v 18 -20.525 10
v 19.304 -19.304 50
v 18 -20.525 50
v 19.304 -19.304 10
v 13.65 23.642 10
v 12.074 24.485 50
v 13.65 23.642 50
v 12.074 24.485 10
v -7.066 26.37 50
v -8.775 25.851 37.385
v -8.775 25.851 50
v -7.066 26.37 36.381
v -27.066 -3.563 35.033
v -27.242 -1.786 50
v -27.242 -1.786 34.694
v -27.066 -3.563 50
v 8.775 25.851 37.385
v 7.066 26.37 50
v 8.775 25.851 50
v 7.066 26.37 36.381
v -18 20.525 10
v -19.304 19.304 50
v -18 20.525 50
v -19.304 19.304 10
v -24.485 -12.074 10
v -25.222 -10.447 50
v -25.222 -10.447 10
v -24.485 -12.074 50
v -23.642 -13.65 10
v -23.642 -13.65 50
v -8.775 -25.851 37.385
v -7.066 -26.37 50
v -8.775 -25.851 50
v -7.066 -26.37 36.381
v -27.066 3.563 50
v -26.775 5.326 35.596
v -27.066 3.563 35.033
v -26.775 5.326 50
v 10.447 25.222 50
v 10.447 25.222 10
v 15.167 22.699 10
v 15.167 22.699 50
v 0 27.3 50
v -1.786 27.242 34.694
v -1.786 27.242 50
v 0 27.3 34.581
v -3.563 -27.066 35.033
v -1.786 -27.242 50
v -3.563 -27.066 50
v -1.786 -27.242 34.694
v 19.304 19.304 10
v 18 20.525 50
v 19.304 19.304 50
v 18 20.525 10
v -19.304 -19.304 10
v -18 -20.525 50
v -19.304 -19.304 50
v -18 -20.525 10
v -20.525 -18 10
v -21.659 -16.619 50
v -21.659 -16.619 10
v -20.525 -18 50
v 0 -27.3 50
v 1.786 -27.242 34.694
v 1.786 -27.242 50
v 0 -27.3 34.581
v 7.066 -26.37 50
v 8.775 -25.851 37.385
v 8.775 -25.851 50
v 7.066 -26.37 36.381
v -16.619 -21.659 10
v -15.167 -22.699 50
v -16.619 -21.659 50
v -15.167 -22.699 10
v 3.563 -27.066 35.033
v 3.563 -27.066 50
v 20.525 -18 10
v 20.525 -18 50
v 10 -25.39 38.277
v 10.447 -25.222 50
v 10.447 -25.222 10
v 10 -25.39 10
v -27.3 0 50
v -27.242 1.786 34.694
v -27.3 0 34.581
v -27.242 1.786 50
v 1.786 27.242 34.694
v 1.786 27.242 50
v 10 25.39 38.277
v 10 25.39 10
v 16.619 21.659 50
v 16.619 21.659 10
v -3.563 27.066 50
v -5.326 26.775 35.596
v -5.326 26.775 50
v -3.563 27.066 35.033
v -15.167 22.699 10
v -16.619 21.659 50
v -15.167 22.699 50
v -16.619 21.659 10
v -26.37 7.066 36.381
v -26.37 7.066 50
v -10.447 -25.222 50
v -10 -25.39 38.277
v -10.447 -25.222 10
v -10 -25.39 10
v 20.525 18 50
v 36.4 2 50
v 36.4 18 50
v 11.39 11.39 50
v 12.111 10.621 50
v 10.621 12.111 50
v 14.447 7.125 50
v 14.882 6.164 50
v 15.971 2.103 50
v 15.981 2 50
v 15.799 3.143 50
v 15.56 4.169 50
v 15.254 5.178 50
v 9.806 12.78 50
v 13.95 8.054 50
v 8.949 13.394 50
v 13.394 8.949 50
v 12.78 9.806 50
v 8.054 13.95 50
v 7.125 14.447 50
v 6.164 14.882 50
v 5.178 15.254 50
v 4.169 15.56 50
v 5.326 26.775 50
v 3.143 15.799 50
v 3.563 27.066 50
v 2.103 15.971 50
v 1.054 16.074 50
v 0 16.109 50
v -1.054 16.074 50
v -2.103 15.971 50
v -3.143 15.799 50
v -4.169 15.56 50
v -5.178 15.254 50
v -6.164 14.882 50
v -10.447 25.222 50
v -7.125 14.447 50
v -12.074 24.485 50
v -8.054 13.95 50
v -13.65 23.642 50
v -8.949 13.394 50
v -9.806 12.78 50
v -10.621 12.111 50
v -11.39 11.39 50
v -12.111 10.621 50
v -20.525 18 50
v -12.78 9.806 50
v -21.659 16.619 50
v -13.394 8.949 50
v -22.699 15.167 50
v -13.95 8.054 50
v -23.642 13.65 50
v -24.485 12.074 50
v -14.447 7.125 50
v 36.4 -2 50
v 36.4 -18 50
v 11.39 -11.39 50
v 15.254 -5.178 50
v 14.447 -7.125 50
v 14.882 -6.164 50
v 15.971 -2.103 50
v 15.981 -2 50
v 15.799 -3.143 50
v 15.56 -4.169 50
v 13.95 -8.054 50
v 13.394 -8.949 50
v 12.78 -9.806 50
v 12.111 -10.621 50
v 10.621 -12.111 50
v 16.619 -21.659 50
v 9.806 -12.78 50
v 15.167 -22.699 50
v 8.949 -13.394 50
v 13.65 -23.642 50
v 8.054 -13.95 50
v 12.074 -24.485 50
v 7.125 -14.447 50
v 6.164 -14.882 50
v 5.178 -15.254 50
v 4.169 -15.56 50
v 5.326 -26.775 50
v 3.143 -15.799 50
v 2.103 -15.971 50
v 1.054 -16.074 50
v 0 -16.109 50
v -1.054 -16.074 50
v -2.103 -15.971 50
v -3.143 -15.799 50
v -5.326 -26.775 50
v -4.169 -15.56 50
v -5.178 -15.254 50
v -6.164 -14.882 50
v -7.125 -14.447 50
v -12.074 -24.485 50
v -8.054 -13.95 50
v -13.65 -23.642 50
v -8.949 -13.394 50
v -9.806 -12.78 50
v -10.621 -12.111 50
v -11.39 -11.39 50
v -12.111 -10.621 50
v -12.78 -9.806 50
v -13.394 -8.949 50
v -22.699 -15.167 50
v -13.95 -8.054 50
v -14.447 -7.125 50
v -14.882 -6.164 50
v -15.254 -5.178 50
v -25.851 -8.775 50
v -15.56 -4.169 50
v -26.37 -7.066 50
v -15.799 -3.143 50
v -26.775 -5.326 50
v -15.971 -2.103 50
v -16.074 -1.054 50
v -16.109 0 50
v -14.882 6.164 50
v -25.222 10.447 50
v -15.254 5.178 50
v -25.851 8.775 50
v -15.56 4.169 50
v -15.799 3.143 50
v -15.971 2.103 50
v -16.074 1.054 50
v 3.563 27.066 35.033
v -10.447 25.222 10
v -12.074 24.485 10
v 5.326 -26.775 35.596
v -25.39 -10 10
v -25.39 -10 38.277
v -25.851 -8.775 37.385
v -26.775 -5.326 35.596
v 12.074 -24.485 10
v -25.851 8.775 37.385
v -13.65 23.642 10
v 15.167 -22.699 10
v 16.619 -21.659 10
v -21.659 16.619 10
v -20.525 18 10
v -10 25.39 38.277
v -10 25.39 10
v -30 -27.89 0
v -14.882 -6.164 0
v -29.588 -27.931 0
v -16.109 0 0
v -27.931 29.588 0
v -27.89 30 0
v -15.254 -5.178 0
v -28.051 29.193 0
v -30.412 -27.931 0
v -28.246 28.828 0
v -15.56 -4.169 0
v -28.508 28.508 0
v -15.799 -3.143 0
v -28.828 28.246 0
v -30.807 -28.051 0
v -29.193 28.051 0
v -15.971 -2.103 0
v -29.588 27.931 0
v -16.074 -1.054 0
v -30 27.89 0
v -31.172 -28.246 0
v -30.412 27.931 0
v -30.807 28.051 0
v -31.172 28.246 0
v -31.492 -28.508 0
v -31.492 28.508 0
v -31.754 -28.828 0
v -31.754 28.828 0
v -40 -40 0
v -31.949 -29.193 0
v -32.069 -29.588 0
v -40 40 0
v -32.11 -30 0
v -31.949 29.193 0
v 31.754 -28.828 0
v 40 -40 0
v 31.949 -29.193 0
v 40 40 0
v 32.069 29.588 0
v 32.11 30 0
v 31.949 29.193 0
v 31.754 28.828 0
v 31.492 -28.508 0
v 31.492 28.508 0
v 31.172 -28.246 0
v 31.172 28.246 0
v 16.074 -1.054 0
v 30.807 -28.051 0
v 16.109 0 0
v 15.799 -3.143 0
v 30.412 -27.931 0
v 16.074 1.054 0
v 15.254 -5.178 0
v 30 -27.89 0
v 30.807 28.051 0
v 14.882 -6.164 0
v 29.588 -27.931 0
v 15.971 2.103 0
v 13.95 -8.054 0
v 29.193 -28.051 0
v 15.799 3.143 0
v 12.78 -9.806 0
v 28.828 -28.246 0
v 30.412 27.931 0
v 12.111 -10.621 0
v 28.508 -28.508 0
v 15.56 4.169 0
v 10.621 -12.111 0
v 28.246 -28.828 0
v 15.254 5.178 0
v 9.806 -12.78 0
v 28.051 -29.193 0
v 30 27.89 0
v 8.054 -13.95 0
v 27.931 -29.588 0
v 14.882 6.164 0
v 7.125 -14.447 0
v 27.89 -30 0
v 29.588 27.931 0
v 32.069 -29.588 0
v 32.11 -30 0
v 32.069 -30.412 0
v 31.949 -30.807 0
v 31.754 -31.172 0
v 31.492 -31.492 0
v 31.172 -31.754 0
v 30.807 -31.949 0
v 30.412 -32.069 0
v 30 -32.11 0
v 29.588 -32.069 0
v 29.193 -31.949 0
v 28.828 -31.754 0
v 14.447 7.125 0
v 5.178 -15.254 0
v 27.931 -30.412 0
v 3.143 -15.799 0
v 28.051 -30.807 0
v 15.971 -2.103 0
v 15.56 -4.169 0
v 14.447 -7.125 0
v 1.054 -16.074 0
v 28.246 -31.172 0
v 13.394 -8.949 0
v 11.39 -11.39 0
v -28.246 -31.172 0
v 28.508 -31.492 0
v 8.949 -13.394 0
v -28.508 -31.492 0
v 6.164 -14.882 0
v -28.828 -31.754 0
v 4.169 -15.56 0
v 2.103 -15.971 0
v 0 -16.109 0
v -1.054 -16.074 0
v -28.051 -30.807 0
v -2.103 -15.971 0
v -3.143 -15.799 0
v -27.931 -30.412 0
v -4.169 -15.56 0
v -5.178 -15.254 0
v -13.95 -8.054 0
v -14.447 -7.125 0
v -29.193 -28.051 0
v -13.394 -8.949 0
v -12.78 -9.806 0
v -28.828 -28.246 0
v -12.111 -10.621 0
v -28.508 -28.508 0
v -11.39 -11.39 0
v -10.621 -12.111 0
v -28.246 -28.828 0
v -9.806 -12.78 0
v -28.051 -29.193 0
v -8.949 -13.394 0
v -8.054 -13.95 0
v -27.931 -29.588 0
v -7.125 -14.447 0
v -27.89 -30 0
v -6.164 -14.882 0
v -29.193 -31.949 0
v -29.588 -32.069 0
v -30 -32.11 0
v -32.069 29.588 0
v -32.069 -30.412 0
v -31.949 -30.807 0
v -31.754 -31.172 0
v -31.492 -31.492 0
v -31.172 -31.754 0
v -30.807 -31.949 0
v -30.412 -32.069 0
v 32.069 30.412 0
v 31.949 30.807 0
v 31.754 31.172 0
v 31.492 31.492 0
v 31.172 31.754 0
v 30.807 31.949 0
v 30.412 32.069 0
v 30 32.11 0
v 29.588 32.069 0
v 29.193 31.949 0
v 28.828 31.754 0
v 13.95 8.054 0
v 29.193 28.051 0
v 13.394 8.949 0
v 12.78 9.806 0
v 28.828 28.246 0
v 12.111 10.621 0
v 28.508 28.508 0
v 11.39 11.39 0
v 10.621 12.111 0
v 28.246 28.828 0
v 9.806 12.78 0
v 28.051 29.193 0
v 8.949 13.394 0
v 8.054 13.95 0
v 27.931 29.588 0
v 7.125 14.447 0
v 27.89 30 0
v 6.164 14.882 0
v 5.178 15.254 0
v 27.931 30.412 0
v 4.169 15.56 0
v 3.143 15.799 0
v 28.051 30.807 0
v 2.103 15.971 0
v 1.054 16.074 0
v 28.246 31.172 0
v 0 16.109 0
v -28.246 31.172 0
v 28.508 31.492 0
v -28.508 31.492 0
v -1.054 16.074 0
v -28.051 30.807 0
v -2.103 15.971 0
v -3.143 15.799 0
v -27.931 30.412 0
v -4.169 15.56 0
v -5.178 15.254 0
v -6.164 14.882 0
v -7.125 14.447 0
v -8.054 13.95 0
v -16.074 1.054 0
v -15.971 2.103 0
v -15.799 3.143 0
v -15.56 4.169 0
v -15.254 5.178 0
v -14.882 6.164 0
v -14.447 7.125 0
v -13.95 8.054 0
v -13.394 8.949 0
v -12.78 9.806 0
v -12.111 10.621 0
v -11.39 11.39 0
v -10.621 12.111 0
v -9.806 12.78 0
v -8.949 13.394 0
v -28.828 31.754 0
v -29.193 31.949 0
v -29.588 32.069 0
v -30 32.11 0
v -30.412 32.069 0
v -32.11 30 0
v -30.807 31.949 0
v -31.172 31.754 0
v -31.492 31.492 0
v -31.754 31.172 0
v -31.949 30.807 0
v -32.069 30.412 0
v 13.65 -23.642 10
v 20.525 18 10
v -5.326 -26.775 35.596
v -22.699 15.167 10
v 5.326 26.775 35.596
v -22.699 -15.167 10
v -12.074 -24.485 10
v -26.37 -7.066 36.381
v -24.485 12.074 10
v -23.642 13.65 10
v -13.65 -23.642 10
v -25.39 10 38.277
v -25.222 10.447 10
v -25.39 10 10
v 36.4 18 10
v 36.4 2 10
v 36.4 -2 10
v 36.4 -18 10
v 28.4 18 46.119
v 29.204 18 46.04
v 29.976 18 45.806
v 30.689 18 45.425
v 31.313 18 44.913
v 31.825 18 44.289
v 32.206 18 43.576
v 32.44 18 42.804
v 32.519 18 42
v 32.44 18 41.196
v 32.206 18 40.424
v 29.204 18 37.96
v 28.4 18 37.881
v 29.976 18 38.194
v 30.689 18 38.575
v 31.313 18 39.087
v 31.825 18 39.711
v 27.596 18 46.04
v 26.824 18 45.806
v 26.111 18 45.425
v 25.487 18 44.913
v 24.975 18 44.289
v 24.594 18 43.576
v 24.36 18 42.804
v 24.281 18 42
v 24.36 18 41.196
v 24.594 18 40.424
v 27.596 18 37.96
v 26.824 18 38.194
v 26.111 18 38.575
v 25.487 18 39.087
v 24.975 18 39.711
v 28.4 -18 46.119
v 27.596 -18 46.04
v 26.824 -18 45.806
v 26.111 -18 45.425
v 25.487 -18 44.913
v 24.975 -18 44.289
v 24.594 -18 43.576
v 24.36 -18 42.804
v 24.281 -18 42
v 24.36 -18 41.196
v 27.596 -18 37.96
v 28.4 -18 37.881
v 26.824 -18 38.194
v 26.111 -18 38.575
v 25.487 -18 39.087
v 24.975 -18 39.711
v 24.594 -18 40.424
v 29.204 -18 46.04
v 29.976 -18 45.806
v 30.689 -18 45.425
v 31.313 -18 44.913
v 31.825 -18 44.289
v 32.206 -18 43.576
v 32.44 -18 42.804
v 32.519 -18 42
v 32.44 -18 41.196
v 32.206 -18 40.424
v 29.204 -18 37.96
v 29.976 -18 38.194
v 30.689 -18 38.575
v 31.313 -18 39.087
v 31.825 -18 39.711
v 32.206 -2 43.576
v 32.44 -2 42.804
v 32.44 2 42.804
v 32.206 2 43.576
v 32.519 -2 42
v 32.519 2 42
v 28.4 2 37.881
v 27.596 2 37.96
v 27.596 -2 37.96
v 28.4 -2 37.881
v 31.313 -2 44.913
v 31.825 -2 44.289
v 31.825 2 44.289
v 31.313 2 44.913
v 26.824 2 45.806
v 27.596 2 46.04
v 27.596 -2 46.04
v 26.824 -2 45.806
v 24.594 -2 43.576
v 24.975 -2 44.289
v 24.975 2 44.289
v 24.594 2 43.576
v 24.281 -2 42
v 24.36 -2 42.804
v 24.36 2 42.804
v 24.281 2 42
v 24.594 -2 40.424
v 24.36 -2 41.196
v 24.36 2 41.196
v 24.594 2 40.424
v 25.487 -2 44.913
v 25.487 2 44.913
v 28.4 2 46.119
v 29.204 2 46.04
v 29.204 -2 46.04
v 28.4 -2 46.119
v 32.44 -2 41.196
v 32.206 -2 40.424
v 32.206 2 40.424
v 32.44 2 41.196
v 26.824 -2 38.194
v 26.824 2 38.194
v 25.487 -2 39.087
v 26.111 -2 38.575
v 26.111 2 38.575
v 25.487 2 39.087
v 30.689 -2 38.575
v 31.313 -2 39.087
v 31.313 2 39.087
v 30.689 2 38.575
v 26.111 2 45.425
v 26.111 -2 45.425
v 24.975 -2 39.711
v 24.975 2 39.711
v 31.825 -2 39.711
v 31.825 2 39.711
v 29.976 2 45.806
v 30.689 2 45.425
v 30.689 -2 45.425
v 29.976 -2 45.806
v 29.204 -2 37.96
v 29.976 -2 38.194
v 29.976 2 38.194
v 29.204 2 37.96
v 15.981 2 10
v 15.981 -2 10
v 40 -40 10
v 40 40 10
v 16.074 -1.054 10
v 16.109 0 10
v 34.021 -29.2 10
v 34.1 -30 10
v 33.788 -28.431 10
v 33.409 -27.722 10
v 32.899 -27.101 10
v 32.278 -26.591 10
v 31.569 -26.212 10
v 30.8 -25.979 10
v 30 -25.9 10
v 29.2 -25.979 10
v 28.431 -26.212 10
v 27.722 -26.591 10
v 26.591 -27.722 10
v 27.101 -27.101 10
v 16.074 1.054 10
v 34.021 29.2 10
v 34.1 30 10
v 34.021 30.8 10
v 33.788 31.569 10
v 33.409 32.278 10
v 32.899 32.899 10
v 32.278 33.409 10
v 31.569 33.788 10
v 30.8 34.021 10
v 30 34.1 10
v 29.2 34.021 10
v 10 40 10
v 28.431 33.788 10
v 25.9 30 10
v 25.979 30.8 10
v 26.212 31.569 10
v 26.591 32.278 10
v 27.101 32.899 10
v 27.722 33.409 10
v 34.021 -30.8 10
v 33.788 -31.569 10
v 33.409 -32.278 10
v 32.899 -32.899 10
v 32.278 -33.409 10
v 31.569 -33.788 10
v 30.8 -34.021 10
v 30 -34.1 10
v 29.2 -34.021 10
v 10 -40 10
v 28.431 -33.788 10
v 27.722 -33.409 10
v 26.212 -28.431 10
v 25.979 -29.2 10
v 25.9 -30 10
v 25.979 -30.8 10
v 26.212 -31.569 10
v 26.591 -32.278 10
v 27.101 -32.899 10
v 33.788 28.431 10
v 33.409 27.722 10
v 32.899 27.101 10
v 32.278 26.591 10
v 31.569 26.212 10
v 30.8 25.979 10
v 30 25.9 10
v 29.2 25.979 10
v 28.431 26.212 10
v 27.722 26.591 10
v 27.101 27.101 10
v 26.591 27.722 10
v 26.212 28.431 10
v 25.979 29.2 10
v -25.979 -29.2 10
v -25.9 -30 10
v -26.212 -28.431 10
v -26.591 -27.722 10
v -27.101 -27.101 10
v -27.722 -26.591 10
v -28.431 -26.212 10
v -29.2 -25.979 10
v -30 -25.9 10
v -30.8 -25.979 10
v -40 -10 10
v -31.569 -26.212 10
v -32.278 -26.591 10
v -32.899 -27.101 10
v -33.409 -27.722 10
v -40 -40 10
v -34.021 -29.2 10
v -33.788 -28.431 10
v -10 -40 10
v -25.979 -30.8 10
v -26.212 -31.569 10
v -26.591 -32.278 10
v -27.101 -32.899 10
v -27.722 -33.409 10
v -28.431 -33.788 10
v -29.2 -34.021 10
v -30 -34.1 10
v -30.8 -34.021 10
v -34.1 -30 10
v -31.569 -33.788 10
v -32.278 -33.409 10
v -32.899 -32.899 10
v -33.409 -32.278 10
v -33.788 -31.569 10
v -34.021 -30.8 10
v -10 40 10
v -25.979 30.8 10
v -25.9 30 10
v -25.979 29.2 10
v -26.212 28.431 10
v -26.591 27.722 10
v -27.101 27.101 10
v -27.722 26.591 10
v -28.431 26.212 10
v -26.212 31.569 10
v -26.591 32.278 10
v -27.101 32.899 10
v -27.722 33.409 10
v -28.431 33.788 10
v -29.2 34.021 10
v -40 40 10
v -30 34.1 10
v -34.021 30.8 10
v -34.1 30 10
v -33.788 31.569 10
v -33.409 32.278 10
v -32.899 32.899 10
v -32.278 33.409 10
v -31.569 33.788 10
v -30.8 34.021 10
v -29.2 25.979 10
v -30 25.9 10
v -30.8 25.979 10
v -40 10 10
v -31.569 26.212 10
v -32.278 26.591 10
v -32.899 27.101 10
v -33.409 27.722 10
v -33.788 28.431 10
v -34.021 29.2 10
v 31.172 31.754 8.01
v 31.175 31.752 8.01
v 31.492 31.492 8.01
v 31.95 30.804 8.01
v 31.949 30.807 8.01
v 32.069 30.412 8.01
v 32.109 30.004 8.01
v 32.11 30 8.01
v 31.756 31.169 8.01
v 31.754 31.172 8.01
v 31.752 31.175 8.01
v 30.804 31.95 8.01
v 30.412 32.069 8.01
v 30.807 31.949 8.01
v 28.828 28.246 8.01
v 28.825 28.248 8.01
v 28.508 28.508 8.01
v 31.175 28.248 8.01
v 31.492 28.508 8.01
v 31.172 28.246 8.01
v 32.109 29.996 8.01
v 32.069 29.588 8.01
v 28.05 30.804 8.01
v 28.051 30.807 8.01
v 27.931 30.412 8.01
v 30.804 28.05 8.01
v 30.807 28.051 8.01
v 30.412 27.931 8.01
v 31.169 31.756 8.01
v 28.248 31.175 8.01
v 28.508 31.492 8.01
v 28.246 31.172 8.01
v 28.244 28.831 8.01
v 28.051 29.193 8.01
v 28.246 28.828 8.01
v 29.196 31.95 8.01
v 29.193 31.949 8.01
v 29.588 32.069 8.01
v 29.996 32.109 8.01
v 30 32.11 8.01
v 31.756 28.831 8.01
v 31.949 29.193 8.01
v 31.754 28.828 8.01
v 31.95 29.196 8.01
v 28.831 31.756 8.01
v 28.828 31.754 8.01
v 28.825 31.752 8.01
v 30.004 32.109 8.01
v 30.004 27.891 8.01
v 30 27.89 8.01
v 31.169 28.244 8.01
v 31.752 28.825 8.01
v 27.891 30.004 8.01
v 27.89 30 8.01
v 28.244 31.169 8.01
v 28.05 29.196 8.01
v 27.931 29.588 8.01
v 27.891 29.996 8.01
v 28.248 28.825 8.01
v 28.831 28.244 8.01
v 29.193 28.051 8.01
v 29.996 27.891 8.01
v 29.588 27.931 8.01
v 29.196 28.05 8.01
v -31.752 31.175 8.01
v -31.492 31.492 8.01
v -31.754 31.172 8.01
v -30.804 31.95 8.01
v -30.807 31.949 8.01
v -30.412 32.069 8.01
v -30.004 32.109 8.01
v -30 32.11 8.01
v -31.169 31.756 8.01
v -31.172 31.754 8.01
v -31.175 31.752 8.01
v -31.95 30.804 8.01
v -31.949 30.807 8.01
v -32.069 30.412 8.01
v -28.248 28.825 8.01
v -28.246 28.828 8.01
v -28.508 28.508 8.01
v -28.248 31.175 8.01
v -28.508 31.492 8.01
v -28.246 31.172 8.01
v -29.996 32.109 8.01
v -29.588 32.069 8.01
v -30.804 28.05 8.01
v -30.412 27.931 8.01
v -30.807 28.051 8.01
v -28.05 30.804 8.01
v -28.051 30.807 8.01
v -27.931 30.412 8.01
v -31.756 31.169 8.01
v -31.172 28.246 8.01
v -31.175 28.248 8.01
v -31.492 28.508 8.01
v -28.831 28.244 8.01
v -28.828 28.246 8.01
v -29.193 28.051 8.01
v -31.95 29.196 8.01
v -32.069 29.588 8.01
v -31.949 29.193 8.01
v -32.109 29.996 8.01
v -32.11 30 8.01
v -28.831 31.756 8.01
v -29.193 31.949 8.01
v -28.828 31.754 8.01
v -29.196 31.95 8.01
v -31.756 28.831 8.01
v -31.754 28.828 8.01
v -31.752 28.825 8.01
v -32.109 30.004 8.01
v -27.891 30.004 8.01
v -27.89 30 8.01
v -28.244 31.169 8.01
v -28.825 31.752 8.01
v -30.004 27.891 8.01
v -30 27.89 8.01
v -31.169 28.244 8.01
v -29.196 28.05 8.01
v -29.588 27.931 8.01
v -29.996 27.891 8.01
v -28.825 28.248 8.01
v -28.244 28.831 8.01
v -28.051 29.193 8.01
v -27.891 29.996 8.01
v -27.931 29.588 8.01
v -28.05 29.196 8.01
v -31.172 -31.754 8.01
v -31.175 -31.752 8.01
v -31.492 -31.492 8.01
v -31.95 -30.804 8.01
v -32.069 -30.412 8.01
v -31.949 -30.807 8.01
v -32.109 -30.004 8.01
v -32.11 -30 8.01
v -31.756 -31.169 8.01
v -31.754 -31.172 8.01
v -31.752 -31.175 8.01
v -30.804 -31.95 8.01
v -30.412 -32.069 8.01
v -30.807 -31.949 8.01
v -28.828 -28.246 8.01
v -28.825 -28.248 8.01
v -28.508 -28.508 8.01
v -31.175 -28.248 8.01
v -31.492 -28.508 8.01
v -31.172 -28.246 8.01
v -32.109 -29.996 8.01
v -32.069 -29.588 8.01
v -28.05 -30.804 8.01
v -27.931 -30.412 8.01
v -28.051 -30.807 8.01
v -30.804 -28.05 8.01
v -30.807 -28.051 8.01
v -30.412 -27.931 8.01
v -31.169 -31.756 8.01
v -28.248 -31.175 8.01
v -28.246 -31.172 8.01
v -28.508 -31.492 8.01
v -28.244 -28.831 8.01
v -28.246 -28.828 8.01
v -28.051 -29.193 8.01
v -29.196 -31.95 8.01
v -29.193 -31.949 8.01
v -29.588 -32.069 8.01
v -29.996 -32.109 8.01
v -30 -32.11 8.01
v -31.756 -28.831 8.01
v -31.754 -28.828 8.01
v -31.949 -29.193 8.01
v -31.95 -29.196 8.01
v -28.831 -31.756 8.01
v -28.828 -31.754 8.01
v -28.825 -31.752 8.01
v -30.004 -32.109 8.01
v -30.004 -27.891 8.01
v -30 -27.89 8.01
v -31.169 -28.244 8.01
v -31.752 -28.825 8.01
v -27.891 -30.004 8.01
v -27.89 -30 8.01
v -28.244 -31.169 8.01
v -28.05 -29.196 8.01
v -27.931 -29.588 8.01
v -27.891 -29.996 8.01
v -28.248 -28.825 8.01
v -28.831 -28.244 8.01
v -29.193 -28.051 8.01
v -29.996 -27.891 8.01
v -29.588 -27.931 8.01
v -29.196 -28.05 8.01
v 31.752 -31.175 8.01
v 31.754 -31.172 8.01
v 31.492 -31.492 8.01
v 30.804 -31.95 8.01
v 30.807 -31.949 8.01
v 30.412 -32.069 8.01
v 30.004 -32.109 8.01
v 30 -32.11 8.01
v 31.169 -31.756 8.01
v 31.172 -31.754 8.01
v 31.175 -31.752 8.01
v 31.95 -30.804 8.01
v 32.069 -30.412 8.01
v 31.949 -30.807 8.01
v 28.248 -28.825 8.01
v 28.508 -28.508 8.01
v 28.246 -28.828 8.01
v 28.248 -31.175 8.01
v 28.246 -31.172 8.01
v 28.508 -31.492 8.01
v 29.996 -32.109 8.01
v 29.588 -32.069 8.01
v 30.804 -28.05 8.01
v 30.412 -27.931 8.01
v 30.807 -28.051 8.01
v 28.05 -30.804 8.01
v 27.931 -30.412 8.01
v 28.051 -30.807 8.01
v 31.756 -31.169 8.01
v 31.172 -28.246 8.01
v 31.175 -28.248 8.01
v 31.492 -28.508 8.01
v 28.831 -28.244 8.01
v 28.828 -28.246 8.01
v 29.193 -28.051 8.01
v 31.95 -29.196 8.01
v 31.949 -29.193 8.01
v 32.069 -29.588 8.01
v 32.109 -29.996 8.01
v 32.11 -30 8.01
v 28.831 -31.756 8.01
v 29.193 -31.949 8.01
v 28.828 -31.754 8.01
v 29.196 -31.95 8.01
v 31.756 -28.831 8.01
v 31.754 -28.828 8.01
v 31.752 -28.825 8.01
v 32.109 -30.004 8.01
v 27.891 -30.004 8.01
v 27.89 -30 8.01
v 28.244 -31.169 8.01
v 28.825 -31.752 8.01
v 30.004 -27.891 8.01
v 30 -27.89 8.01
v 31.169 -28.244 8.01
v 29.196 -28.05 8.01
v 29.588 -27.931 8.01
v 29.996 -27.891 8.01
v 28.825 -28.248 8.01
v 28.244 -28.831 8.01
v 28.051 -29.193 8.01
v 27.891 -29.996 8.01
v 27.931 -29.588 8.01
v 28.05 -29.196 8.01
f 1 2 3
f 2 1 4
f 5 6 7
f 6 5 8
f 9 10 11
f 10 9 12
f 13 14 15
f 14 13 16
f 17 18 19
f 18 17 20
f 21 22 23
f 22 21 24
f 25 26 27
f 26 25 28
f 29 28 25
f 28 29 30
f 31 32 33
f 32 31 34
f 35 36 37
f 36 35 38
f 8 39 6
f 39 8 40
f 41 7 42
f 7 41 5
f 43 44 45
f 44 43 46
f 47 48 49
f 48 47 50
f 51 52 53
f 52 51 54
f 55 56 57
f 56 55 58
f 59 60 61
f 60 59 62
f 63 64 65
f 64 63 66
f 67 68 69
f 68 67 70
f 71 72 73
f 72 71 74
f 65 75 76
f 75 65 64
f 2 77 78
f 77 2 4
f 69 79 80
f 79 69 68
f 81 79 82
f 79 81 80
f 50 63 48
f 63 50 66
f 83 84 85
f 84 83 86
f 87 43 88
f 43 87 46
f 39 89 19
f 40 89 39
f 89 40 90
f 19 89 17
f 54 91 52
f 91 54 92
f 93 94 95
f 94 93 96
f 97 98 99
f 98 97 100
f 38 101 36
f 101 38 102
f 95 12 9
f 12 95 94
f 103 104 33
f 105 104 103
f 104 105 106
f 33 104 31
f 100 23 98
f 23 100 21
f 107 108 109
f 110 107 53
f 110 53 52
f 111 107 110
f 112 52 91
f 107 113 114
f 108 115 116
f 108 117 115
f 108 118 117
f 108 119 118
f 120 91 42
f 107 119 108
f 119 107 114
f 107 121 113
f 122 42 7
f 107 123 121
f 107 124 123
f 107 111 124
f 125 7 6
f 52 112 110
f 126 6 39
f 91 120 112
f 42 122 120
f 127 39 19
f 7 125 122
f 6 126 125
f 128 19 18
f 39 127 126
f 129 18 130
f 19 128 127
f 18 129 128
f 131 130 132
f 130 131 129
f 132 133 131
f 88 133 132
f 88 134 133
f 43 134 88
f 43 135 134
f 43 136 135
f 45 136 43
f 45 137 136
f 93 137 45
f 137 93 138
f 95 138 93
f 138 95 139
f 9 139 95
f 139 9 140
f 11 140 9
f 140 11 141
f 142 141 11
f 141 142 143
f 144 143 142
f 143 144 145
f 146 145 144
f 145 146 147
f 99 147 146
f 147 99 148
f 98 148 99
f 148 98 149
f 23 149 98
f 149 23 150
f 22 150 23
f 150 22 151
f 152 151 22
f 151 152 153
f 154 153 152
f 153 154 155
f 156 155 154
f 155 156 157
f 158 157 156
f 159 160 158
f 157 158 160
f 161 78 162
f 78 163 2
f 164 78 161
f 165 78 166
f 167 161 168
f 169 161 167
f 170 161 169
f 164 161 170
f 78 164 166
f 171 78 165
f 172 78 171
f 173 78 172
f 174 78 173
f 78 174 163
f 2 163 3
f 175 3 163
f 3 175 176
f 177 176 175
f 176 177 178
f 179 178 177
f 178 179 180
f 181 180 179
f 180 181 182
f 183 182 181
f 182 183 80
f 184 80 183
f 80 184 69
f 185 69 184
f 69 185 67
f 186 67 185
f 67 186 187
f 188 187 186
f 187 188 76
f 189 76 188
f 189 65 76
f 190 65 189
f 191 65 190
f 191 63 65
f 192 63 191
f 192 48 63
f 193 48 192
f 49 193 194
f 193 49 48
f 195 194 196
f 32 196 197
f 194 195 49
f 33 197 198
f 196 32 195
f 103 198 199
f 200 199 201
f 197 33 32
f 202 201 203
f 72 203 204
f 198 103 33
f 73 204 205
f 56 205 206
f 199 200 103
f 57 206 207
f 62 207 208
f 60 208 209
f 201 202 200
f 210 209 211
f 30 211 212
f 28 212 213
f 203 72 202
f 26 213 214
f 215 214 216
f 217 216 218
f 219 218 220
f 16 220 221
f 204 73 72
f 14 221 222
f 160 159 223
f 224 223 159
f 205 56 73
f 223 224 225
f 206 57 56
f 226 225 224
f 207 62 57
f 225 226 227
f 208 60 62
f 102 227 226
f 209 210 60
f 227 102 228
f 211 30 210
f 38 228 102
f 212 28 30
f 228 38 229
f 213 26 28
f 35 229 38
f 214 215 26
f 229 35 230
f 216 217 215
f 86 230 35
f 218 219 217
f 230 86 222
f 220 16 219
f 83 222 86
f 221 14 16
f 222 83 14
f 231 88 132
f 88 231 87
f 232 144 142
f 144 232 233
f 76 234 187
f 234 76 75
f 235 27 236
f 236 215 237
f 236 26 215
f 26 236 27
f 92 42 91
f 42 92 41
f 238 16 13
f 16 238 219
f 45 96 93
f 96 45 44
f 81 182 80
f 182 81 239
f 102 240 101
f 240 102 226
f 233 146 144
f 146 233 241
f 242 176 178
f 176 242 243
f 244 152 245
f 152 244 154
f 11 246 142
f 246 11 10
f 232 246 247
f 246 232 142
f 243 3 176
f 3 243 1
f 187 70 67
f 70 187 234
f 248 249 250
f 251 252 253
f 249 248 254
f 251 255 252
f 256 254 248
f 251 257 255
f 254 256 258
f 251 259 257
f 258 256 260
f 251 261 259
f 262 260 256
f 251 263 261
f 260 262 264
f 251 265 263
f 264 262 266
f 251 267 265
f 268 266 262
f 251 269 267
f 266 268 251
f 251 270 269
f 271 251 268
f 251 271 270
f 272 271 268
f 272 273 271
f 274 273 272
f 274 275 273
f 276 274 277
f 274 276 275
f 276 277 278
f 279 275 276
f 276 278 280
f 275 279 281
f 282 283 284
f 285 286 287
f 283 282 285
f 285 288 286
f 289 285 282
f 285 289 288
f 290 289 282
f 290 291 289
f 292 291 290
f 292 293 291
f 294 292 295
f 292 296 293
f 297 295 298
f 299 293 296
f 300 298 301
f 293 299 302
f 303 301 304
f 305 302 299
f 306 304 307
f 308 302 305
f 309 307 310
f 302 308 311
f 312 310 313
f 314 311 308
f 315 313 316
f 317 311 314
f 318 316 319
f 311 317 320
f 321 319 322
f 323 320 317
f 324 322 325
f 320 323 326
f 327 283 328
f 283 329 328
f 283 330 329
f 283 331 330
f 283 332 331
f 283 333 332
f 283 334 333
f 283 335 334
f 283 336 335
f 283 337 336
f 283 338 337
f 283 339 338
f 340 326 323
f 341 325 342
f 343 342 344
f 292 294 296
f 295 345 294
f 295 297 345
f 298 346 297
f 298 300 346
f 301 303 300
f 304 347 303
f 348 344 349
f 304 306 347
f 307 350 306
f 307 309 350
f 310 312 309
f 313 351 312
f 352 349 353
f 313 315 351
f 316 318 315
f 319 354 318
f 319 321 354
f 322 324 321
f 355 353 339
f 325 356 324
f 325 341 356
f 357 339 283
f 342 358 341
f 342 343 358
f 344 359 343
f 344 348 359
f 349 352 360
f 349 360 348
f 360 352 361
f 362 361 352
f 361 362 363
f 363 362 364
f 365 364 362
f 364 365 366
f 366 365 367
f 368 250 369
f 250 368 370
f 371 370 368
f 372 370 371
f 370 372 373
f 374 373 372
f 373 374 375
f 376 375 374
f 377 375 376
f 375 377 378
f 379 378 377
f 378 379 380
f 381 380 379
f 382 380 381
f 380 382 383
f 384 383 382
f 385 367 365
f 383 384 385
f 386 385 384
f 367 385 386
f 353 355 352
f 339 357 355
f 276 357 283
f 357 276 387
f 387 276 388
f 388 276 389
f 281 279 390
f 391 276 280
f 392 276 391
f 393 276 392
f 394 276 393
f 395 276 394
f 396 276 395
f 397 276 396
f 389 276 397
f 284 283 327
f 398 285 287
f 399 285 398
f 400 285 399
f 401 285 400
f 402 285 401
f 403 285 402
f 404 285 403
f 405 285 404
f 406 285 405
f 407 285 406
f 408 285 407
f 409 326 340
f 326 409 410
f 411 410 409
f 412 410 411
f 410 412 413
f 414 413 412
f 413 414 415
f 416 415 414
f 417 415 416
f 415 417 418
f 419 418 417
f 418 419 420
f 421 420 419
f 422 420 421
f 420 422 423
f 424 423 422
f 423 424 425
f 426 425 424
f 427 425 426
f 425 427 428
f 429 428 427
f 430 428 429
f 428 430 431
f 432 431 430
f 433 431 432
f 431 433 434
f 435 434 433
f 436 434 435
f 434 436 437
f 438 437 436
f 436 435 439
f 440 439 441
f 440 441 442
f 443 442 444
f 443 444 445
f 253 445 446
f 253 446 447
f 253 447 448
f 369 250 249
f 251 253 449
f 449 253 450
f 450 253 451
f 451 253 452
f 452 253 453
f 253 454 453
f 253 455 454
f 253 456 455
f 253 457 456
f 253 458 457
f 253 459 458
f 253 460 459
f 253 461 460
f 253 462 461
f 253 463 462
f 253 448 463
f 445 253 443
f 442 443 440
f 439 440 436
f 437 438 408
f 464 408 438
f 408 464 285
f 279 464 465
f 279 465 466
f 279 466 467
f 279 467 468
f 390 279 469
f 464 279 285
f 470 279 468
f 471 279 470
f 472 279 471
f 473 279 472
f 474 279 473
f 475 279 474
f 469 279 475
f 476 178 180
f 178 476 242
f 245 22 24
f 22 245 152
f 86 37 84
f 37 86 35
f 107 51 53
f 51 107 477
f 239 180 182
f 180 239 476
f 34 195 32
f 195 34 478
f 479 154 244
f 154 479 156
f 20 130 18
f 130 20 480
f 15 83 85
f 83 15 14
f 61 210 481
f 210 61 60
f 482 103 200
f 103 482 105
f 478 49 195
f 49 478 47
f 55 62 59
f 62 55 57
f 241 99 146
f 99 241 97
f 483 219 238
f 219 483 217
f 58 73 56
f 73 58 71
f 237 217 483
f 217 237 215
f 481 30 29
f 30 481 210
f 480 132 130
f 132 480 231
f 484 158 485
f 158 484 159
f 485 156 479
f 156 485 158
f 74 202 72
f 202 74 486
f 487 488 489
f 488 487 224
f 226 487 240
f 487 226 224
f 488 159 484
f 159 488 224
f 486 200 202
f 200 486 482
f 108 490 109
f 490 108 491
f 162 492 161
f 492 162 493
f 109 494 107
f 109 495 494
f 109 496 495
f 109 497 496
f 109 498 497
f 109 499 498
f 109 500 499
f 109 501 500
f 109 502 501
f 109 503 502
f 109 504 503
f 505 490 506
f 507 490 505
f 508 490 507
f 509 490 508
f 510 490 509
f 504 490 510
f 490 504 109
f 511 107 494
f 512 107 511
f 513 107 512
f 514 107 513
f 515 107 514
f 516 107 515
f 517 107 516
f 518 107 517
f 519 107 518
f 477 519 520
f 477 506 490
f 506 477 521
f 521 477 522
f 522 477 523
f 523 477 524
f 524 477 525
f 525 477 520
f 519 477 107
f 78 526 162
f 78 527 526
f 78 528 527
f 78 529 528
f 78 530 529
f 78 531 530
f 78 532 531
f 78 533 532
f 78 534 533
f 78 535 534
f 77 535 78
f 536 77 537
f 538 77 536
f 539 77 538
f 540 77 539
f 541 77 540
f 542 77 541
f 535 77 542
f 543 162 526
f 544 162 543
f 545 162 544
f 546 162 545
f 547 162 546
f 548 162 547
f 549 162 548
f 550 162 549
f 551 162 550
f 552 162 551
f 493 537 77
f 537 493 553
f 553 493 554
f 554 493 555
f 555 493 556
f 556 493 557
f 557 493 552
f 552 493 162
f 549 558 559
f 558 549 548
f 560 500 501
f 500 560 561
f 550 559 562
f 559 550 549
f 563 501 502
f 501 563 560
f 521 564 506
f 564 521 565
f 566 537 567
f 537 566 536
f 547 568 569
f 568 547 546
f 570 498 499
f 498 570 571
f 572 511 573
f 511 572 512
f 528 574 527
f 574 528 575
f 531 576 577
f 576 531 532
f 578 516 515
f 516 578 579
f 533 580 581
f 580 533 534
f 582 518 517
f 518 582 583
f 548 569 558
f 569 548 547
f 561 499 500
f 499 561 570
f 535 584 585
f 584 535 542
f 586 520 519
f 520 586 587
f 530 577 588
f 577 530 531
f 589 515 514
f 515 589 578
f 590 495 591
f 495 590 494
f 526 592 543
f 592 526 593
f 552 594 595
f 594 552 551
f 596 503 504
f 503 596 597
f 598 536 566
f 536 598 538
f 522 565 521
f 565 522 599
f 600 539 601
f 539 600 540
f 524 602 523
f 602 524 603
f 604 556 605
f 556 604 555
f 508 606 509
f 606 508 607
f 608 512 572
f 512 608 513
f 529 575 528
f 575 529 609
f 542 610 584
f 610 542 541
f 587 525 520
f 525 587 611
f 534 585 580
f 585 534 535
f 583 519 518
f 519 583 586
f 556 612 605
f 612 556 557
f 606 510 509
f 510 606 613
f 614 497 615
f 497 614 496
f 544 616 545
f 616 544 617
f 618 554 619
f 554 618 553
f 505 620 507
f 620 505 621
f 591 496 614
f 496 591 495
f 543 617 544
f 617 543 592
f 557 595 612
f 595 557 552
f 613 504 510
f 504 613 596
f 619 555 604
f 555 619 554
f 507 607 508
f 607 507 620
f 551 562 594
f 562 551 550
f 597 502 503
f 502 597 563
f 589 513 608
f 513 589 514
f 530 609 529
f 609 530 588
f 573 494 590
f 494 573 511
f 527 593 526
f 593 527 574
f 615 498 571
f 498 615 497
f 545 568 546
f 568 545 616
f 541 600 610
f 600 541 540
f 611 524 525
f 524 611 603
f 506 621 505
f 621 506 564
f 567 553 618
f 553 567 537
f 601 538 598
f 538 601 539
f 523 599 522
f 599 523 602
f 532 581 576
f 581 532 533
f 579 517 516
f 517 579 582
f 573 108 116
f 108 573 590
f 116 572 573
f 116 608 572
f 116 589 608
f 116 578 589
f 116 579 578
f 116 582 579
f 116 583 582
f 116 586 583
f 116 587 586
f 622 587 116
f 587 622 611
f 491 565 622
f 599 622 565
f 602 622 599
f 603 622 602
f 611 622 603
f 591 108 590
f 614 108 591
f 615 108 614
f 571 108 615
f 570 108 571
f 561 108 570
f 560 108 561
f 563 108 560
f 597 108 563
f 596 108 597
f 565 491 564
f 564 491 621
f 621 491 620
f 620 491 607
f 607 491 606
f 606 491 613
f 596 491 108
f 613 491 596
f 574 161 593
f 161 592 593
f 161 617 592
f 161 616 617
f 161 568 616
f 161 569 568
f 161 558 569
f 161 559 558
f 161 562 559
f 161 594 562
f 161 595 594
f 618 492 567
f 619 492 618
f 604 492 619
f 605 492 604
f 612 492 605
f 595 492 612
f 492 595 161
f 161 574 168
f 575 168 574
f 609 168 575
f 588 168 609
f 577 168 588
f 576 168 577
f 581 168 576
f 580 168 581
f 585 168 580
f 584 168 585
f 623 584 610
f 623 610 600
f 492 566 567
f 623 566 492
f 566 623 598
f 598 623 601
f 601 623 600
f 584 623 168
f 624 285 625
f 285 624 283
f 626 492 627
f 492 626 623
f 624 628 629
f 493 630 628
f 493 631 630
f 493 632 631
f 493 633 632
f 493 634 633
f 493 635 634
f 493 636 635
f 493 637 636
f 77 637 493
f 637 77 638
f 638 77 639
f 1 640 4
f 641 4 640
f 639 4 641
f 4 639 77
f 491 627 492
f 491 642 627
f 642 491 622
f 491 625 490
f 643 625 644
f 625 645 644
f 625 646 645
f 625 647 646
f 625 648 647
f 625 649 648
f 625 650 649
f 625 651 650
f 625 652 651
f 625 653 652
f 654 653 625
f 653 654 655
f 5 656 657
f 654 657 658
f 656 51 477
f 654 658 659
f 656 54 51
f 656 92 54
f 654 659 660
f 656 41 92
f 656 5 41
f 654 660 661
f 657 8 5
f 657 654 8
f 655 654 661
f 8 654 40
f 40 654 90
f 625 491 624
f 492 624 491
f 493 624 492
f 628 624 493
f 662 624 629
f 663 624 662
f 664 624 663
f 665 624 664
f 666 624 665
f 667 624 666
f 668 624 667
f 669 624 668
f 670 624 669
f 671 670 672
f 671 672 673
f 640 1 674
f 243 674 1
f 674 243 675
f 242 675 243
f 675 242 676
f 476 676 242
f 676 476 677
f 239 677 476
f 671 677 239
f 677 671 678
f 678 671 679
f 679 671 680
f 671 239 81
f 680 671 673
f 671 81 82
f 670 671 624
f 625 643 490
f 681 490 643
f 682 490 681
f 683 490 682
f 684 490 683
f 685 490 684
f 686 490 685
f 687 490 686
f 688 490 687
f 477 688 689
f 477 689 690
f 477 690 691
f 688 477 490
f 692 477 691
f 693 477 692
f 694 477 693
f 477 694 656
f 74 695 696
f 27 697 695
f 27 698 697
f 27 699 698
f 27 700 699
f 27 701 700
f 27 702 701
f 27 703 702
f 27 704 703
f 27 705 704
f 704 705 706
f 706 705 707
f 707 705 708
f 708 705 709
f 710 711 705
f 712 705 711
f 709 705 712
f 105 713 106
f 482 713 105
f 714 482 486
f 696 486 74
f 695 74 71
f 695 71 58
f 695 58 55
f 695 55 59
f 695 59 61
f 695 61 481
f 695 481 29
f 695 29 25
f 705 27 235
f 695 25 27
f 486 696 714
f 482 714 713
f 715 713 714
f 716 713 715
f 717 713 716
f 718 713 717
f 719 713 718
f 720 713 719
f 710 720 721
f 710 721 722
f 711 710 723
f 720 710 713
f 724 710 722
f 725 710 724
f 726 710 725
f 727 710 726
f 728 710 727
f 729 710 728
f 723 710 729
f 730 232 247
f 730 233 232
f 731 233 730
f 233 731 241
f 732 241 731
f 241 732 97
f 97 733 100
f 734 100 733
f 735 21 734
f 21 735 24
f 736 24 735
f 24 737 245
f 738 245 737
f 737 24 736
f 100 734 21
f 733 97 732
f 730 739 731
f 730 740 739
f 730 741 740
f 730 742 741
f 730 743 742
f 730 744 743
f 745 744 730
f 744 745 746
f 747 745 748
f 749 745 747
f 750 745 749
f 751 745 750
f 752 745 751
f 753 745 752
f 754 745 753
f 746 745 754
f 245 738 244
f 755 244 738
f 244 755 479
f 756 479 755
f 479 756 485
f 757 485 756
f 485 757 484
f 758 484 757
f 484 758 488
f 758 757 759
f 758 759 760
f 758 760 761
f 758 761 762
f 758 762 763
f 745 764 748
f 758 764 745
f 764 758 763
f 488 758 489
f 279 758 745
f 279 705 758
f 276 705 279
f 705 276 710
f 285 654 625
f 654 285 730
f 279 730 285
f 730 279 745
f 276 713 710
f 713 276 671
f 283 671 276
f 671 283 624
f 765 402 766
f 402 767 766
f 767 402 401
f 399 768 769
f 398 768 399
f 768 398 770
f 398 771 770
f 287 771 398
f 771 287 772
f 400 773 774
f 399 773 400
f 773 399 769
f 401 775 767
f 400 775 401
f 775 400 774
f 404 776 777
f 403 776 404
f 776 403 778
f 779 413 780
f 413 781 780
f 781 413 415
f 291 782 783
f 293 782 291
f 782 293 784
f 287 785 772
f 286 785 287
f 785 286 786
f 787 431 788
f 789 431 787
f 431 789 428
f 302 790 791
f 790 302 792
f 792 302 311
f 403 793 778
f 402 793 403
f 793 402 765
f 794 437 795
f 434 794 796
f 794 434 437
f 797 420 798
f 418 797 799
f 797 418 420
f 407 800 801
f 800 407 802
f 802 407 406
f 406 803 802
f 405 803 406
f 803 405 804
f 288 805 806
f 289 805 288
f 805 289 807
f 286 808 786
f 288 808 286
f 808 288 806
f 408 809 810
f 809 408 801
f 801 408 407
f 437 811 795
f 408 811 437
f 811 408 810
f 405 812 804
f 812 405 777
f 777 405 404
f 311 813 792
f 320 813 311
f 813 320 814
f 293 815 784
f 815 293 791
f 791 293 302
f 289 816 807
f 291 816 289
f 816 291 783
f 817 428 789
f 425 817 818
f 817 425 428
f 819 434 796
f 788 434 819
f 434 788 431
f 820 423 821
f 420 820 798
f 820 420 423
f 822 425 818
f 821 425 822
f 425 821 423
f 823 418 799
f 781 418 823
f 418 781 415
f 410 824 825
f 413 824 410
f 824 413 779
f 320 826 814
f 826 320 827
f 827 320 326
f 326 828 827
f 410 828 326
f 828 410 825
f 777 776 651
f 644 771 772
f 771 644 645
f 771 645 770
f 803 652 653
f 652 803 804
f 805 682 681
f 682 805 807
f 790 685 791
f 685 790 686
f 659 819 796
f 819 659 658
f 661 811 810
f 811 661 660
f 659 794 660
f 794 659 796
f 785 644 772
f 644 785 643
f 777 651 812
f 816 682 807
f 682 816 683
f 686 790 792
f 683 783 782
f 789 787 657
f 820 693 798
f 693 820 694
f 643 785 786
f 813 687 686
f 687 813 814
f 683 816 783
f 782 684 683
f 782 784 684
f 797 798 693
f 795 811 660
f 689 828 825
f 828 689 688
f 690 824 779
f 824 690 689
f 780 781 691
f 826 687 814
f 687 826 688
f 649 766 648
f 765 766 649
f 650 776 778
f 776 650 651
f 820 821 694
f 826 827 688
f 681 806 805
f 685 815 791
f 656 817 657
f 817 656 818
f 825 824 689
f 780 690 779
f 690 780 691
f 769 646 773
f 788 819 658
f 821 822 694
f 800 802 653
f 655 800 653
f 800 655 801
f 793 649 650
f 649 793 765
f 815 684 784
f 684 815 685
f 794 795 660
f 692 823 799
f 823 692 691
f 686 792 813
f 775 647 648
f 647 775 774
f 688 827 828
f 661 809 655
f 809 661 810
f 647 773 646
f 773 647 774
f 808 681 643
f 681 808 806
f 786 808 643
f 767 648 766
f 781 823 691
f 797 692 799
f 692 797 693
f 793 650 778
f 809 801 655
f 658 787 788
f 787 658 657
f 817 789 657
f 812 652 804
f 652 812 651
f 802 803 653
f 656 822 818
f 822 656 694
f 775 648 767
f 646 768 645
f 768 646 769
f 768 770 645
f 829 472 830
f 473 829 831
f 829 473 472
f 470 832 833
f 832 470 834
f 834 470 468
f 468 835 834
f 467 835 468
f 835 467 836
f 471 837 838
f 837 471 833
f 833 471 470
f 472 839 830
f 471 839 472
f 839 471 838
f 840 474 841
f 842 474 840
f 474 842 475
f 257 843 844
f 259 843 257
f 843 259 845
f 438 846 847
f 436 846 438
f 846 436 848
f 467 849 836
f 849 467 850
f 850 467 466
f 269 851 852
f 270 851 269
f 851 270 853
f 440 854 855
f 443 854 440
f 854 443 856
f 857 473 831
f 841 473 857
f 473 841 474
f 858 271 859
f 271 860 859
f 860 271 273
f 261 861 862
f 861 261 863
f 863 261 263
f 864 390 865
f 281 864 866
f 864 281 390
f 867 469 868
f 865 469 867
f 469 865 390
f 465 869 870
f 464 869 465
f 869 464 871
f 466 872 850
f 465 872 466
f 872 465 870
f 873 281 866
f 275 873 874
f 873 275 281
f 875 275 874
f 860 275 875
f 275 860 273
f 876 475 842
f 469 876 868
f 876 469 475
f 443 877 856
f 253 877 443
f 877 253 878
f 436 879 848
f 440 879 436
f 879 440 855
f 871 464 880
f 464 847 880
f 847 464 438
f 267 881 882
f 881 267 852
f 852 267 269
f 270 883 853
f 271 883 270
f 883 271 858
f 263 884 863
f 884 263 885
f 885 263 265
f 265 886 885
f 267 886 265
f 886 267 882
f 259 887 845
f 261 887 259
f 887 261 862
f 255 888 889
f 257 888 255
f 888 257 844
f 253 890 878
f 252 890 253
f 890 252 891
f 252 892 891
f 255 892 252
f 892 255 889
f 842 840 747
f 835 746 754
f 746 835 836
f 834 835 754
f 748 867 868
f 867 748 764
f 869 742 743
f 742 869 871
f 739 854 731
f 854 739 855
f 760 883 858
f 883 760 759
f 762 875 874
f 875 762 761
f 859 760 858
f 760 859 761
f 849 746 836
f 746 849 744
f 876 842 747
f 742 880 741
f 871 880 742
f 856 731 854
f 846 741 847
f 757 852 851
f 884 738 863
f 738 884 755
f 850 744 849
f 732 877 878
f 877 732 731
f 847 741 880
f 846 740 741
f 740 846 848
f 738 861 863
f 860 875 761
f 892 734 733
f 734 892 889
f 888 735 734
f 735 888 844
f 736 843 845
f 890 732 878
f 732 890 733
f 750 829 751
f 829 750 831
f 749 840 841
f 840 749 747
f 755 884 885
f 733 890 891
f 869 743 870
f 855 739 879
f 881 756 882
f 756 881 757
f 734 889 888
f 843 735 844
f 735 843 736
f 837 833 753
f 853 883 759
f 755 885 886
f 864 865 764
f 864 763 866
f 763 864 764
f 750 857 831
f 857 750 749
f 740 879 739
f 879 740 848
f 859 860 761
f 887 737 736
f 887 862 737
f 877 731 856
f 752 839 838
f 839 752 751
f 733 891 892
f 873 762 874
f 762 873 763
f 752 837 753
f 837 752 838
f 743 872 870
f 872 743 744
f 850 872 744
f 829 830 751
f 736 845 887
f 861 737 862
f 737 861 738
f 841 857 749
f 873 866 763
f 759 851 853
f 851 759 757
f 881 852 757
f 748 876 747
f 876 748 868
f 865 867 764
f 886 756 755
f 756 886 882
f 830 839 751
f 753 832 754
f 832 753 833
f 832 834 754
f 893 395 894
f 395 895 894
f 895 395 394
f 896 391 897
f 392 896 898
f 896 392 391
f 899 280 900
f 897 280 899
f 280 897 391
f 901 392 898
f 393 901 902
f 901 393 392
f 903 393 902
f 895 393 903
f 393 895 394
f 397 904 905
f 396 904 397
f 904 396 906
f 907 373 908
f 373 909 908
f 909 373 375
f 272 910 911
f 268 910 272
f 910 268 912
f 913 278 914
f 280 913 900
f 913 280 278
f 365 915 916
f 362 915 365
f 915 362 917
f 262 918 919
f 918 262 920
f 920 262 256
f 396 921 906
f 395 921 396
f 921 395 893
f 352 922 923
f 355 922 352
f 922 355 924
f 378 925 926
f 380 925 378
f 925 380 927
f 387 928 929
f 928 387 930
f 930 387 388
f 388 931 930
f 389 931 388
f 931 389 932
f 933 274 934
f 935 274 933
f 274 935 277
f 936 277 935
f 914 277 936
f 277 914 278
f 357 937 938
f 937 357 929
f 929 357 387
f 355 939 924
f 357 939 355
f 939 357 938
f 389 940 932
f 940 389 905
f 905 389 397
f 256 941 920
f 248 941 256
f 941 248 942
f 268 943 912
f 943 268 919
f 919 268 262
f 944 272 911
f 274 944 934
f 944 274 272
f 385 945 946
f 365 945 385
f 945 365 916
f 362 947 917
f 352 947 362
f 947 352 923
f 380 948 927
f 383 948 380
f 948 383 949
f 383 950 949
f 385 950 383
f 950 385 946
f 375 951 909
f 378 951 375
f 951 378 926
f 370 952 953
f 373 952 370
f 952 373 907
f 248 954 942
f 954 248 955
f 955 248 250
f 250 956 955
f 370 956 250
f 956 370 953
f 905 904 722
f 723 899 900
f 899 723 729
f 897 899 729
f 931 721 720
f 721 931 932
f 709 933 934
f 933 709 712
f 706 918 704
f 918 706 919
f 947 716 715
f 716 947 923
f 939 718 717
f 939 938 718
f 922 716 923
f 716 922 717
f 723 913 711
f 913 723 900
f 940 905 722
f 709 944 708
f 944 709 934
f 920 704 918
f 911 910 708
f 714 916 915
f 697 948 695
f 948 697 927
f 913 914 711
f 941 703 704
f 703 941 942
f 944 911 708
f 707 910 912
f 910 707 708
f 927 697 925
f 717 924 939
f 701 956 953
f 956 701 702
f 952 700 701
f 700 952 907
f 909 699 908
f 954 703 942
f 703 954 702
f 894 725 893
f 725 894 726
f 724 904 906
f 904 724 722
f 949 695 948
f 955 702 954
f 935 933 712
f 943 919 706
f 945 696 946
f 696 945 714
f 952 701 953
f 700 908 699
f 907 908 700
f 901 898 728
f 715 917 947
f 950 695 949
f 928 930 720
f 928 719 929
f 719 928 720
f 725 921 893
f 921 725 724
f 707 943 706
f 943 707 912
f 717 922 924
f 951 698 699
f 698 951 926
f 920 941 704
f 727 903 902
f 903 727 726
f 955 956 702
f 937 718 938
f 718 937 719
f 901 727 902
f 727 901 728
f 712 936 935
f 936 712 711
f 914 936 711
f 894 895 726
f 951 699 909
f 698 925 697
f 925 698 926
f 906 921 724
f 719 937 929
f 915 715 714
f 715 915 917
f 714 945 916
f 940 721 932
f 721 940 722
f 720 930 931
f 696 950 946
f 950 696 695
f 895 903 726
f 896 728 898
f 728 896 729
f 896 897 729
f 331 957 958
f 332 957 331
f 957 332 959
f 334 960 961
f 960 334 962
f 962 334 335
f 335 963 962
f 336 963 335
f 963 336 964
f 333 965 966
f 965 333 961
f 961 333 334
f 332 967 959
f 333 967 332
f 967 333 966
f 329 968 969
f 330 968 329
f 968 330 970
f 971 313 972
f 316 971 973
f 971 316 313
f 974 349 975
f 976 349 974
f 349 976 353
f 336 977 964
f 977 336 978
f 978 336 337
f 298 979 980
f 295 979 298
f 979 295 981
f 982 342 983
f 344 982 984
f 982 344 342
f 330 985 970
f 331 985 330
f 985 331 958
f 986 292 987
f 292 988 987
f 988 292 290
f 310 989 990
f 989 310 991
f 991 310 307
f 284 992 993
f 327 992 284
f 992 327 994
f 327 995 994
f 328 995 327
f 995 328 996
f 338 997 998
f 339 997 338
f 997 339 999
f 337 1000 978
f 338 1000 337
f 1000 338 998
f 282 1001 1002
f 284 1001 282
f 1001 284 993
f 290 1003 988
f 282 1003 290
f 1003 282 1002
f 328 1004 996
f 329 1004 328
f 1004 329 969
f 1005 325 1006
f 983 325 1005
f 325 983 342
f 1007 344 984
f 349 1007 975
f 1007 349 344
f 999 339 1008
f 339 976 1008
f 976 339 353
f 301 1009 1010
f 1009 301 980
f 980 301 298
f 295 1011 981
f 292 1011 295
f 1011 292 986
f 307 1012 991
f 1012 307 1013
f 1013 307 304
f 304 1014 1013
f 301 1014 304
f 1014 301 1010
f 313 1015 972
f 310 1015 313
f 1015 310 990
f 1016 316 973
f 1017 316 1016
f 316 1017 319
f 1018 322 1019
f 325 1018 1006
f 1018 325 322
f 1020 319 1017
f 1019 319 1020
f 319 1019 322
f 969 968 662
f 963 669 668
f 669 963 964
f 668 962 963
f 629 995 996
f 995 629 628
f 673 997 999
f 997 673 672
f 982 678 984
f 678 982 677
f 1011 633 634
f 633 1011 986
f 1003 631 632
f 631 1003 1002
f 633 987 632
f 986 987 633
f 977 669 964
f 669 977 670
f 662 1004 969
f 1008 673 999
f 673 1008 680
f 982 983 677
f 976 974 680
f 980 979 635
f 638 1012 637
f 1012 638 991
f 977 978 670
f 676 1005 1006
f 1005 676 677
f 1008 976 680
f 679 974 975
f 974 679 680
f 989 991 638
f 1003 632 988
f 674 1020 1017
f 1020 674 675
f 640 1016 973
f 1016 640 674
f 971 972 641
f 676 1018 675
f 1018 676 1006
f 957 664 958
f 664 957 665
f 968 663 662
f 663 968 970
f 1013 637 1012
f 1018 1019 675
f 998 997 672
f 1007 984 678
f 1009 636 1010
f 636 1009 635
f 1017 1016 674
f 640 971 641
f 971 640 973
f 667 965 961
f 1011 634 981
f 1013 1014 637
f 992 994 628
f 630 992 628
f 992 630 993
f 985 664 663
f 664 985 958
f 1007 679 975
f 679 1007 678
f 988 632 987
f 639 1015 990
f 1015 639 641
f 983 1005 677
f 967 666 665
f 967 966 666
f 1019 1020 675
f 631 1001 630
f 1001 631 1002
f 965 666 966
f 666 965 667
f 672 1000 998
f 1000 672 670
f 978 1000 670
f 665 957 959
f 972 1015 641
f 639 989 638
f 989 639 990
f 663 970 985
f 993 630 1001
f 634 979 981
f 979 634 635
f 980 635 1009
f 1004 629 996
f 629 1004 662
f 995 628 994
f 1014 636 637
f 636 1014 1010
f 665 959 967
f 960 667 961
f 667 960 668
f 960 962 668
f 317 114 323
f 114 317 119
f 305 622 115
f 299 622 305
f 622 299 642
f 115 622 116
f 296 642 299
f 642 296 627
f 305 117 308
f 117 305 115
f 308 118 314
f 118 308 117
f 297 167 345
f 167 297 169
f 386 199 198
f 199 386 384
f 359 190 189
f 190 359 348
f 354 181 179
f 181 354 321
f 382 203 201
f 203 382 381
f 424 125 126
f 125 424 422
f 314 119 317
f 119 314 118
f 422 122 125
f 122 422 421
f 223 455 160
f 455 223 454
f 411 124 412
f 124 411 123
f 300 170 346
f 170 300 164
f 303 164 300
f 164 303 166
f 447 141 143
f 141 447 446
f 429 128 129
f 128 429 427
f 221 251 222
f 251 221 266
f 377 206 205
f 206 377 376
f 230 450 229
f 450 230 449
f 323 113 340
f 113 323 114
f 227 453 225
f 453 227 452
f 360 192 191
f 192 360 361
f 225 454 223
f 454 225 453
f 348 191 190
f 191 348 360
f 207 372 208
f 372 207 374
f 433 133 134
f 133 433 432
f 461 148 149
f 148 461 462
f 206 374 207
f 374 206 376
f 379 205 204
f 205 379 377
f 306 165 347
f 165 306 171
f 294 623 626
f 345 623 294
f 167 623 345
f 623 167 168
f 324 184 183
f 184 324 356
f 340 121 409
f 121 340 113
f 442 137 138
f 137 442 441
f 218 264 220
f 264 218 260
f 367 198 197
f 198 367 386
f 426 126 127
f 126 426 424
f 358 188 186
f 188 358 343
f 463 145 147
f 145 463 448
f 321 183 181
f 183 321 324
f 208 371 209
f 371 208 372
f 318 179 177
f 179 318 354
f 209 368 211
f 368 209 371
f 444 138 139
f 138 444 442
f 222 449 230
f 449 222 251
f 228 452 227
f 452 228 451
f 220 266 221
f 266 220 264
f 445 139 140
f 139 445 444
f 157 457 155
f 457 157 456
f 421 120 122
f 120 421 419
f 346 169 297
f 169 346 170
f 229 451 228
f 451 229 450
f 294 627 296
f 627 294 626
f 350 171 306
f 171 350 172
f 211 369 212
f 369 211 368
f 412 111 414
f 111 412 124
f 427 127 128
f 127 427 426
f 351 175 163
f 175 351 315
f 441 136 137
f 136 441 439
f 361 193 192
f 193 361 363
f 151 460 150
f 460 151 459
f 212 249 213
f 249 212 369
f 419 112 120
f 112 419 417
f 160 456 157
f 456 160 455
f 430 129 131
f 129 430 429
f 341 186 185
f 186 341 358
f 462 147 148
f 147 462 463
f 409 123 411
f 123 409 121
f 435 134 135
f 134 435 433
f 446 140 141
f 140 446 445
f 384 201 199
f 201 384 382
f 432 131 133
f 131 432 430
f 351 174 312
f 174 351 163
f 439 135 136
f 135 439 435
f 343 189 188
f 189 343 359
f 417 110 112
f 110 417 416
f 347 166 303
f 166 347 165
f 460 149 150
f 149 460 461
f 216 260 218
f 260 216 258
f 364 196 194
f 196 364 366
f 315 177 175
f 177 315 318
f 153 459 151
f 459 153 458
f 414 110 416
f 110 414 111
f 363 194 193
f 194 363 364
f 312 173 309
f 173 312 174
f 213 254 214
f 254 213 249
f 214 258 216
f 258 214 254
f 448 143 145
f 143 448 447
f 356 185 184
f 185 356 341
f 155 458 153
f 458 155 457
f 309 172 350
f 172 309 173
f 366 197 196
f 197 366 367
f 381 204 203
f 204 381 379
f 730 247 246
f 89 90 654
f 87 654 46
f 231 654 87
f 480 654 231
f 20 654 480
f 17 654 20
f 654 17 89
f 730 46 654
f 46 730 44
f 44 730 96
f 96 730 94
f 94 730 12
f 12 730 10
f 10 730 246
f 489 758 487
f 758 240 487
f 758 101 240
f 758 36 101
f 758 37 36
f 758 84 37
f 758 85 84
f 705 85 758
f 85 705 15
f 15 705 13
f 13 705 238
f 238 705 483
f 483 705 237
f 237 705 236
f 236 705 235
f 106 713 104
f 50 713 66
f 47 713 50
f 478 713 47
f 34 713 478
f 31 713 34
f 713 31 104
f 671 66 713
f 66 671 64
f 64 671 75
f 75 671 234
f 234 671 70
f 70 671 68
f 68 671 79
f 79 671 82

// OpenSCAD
// file: bolts.scad
$radial_error = 0.1;
$fn = 32;

module cylinder_outer(height, radius, fn=$fn) {
	fudge = 1/cos(180/fn);
	cylinder(h=height,r=radius*fudge+$radial_error, $fn=fn);
}

module cylinder_inner(height, radius, fn=$fn) {
	cylinder(h=height,r=radius-$radial_error,$fn=fn);
}

// Make a hole for a bolt/screw combination.
module bolt(diameter=3, depth=8, nut_offset=2, shaft_length=10, inset=10) {
	hole(diameter, depth, inset);
	hull() {
		shaft_width = diameter;
		translate([0, 0, nut_offset]) rotate(360/12, [0, 0, 1]) cylinder_outer(diameter, shaft_width, 6);
		translate([0, shaft_length, nut_offset]) rotate(360/12, [0, 0, 1]) cylinder_outer(diameter, shaft_width, 6);
	}
}

// Make a hole. The diameter is the size of the screw (e.g. 3 for M3). Depth is how far the hole should go for the thread, and inset is how far out there should be a hole for the head to go.
module hole(diameter=3, depth=6, inset=10) {
	cylinder_outer(depth, diameter/2);
	translate([0, 0, depth]) cylinder_outer(inset, diameter, 32);
}

module countersunk_hole(diameter=3, depth=6, inset=10) {
	hole(diameter, depth, inset);
	translate([0, 0, depth-diameter/2]) cylinder(r1=diameter/2+$radial_error, r2=diameter+$radial_error, h=diameter/2);
}

module mounting_hole(diameter=3, depth=6, inset=10, outset=3) {
	difference() {
		cylinder_outer(depth, diameter/2+outset);
		hole(diameter=diameter, depth=depth, inset=inset);
	}
}

rotate(90, [1, 0, 0]) difference() {
	cube([30, 10, 10]);
	translate([5, 5, 0]) bolt(diameter=3, depth=8);
	translate([15, 5, 0]) bolt(diameter=4, depth=8);
	translate([25, 5, 0]) countersunk_hole(diameter=4, depth=8);
}
// file: parts.scad
use <bolts.scad>;
use <zcube.scad>;

large_radius = 34.8/2;
small_radius = 32/2;

rf = 3;

thickness = 34+2;
sleve_thickness = 10;
outer_radius = large_radius + sleve_thickness;

outset = 16+2;

module block(height = 30) {
	translate([outer_radius, 0, height/2]) cube([outset, thickness, height], true);
}

module cutout(height = 30, thickness = 4) {
	translate([0, -thickness/2, 0]) #cube([(outer_radius*2+outset)/2, thickness, height]);
}

module sleve(height, hole_offset) {
	render() difference() {
		render() union() {
			cylinder_inner(height, outer_radius, 32*rf);
			block(height);
		}
		
		children();
		
		translate([outer_radius+1, thickness/2+1, hole_offset]) rotate(90, [1, 0, 0]) hole(8, thickness + 2, 0);
		
		cutout(height);
	}
}

module telescope_cutout(height) {
	tube_offset = height / 2;
	
	render() union() {
		cylinder_outer(tube_offset, small_radius, 32*rf);
		translate([0, 0, tube_offset]) cylinder_outer(height-tube_offset, large_radius, 32*rf);
	}
}
// file: zcube.scad
// This function creates a cube with a given x/y either above (f=1) or below (f=-1) the z axis.
module zcube(dimensions, z=0, f=1) {
	translate([0, 0, dimensions[2]/2 * f + z]) cube(dimensions, true);
}
// main file
use <zcube.scad>;
include <parts.scad>;

module base_cutout(height) {
	cylinder_outer(height, small_radius, 32*rf);
}

module support(size=80, height=30) {
	render() hull() {
		translate([size/2-20/2, 0, 0]) #zcube([20, 20, 10]);
		translate([size/2-18, 0, height]) #zcube([5, 20, 10]);
	}
}

module plate(height = 50, size = 80, thickness=10) {
	difference() {
		union() {
			sleve(height, height - 8);
			zcube([size, size, thickness]);
		}
		
		for (r = [0:90:360]) {
			rotate([0, 0, r]) {
				translate([size/2-10, size/2-10, 0]) countersunk_hole(4, thickness, 0);
			}
		}
		
		cylinder_outer(height, small_radius, 32*rf);
	}
	
	rotate([0, 0, 90]) support(size);
	rotate([0, 0, 180]) support(size);
	rotate([0, 0, 270]) support(size);
}

plate();
